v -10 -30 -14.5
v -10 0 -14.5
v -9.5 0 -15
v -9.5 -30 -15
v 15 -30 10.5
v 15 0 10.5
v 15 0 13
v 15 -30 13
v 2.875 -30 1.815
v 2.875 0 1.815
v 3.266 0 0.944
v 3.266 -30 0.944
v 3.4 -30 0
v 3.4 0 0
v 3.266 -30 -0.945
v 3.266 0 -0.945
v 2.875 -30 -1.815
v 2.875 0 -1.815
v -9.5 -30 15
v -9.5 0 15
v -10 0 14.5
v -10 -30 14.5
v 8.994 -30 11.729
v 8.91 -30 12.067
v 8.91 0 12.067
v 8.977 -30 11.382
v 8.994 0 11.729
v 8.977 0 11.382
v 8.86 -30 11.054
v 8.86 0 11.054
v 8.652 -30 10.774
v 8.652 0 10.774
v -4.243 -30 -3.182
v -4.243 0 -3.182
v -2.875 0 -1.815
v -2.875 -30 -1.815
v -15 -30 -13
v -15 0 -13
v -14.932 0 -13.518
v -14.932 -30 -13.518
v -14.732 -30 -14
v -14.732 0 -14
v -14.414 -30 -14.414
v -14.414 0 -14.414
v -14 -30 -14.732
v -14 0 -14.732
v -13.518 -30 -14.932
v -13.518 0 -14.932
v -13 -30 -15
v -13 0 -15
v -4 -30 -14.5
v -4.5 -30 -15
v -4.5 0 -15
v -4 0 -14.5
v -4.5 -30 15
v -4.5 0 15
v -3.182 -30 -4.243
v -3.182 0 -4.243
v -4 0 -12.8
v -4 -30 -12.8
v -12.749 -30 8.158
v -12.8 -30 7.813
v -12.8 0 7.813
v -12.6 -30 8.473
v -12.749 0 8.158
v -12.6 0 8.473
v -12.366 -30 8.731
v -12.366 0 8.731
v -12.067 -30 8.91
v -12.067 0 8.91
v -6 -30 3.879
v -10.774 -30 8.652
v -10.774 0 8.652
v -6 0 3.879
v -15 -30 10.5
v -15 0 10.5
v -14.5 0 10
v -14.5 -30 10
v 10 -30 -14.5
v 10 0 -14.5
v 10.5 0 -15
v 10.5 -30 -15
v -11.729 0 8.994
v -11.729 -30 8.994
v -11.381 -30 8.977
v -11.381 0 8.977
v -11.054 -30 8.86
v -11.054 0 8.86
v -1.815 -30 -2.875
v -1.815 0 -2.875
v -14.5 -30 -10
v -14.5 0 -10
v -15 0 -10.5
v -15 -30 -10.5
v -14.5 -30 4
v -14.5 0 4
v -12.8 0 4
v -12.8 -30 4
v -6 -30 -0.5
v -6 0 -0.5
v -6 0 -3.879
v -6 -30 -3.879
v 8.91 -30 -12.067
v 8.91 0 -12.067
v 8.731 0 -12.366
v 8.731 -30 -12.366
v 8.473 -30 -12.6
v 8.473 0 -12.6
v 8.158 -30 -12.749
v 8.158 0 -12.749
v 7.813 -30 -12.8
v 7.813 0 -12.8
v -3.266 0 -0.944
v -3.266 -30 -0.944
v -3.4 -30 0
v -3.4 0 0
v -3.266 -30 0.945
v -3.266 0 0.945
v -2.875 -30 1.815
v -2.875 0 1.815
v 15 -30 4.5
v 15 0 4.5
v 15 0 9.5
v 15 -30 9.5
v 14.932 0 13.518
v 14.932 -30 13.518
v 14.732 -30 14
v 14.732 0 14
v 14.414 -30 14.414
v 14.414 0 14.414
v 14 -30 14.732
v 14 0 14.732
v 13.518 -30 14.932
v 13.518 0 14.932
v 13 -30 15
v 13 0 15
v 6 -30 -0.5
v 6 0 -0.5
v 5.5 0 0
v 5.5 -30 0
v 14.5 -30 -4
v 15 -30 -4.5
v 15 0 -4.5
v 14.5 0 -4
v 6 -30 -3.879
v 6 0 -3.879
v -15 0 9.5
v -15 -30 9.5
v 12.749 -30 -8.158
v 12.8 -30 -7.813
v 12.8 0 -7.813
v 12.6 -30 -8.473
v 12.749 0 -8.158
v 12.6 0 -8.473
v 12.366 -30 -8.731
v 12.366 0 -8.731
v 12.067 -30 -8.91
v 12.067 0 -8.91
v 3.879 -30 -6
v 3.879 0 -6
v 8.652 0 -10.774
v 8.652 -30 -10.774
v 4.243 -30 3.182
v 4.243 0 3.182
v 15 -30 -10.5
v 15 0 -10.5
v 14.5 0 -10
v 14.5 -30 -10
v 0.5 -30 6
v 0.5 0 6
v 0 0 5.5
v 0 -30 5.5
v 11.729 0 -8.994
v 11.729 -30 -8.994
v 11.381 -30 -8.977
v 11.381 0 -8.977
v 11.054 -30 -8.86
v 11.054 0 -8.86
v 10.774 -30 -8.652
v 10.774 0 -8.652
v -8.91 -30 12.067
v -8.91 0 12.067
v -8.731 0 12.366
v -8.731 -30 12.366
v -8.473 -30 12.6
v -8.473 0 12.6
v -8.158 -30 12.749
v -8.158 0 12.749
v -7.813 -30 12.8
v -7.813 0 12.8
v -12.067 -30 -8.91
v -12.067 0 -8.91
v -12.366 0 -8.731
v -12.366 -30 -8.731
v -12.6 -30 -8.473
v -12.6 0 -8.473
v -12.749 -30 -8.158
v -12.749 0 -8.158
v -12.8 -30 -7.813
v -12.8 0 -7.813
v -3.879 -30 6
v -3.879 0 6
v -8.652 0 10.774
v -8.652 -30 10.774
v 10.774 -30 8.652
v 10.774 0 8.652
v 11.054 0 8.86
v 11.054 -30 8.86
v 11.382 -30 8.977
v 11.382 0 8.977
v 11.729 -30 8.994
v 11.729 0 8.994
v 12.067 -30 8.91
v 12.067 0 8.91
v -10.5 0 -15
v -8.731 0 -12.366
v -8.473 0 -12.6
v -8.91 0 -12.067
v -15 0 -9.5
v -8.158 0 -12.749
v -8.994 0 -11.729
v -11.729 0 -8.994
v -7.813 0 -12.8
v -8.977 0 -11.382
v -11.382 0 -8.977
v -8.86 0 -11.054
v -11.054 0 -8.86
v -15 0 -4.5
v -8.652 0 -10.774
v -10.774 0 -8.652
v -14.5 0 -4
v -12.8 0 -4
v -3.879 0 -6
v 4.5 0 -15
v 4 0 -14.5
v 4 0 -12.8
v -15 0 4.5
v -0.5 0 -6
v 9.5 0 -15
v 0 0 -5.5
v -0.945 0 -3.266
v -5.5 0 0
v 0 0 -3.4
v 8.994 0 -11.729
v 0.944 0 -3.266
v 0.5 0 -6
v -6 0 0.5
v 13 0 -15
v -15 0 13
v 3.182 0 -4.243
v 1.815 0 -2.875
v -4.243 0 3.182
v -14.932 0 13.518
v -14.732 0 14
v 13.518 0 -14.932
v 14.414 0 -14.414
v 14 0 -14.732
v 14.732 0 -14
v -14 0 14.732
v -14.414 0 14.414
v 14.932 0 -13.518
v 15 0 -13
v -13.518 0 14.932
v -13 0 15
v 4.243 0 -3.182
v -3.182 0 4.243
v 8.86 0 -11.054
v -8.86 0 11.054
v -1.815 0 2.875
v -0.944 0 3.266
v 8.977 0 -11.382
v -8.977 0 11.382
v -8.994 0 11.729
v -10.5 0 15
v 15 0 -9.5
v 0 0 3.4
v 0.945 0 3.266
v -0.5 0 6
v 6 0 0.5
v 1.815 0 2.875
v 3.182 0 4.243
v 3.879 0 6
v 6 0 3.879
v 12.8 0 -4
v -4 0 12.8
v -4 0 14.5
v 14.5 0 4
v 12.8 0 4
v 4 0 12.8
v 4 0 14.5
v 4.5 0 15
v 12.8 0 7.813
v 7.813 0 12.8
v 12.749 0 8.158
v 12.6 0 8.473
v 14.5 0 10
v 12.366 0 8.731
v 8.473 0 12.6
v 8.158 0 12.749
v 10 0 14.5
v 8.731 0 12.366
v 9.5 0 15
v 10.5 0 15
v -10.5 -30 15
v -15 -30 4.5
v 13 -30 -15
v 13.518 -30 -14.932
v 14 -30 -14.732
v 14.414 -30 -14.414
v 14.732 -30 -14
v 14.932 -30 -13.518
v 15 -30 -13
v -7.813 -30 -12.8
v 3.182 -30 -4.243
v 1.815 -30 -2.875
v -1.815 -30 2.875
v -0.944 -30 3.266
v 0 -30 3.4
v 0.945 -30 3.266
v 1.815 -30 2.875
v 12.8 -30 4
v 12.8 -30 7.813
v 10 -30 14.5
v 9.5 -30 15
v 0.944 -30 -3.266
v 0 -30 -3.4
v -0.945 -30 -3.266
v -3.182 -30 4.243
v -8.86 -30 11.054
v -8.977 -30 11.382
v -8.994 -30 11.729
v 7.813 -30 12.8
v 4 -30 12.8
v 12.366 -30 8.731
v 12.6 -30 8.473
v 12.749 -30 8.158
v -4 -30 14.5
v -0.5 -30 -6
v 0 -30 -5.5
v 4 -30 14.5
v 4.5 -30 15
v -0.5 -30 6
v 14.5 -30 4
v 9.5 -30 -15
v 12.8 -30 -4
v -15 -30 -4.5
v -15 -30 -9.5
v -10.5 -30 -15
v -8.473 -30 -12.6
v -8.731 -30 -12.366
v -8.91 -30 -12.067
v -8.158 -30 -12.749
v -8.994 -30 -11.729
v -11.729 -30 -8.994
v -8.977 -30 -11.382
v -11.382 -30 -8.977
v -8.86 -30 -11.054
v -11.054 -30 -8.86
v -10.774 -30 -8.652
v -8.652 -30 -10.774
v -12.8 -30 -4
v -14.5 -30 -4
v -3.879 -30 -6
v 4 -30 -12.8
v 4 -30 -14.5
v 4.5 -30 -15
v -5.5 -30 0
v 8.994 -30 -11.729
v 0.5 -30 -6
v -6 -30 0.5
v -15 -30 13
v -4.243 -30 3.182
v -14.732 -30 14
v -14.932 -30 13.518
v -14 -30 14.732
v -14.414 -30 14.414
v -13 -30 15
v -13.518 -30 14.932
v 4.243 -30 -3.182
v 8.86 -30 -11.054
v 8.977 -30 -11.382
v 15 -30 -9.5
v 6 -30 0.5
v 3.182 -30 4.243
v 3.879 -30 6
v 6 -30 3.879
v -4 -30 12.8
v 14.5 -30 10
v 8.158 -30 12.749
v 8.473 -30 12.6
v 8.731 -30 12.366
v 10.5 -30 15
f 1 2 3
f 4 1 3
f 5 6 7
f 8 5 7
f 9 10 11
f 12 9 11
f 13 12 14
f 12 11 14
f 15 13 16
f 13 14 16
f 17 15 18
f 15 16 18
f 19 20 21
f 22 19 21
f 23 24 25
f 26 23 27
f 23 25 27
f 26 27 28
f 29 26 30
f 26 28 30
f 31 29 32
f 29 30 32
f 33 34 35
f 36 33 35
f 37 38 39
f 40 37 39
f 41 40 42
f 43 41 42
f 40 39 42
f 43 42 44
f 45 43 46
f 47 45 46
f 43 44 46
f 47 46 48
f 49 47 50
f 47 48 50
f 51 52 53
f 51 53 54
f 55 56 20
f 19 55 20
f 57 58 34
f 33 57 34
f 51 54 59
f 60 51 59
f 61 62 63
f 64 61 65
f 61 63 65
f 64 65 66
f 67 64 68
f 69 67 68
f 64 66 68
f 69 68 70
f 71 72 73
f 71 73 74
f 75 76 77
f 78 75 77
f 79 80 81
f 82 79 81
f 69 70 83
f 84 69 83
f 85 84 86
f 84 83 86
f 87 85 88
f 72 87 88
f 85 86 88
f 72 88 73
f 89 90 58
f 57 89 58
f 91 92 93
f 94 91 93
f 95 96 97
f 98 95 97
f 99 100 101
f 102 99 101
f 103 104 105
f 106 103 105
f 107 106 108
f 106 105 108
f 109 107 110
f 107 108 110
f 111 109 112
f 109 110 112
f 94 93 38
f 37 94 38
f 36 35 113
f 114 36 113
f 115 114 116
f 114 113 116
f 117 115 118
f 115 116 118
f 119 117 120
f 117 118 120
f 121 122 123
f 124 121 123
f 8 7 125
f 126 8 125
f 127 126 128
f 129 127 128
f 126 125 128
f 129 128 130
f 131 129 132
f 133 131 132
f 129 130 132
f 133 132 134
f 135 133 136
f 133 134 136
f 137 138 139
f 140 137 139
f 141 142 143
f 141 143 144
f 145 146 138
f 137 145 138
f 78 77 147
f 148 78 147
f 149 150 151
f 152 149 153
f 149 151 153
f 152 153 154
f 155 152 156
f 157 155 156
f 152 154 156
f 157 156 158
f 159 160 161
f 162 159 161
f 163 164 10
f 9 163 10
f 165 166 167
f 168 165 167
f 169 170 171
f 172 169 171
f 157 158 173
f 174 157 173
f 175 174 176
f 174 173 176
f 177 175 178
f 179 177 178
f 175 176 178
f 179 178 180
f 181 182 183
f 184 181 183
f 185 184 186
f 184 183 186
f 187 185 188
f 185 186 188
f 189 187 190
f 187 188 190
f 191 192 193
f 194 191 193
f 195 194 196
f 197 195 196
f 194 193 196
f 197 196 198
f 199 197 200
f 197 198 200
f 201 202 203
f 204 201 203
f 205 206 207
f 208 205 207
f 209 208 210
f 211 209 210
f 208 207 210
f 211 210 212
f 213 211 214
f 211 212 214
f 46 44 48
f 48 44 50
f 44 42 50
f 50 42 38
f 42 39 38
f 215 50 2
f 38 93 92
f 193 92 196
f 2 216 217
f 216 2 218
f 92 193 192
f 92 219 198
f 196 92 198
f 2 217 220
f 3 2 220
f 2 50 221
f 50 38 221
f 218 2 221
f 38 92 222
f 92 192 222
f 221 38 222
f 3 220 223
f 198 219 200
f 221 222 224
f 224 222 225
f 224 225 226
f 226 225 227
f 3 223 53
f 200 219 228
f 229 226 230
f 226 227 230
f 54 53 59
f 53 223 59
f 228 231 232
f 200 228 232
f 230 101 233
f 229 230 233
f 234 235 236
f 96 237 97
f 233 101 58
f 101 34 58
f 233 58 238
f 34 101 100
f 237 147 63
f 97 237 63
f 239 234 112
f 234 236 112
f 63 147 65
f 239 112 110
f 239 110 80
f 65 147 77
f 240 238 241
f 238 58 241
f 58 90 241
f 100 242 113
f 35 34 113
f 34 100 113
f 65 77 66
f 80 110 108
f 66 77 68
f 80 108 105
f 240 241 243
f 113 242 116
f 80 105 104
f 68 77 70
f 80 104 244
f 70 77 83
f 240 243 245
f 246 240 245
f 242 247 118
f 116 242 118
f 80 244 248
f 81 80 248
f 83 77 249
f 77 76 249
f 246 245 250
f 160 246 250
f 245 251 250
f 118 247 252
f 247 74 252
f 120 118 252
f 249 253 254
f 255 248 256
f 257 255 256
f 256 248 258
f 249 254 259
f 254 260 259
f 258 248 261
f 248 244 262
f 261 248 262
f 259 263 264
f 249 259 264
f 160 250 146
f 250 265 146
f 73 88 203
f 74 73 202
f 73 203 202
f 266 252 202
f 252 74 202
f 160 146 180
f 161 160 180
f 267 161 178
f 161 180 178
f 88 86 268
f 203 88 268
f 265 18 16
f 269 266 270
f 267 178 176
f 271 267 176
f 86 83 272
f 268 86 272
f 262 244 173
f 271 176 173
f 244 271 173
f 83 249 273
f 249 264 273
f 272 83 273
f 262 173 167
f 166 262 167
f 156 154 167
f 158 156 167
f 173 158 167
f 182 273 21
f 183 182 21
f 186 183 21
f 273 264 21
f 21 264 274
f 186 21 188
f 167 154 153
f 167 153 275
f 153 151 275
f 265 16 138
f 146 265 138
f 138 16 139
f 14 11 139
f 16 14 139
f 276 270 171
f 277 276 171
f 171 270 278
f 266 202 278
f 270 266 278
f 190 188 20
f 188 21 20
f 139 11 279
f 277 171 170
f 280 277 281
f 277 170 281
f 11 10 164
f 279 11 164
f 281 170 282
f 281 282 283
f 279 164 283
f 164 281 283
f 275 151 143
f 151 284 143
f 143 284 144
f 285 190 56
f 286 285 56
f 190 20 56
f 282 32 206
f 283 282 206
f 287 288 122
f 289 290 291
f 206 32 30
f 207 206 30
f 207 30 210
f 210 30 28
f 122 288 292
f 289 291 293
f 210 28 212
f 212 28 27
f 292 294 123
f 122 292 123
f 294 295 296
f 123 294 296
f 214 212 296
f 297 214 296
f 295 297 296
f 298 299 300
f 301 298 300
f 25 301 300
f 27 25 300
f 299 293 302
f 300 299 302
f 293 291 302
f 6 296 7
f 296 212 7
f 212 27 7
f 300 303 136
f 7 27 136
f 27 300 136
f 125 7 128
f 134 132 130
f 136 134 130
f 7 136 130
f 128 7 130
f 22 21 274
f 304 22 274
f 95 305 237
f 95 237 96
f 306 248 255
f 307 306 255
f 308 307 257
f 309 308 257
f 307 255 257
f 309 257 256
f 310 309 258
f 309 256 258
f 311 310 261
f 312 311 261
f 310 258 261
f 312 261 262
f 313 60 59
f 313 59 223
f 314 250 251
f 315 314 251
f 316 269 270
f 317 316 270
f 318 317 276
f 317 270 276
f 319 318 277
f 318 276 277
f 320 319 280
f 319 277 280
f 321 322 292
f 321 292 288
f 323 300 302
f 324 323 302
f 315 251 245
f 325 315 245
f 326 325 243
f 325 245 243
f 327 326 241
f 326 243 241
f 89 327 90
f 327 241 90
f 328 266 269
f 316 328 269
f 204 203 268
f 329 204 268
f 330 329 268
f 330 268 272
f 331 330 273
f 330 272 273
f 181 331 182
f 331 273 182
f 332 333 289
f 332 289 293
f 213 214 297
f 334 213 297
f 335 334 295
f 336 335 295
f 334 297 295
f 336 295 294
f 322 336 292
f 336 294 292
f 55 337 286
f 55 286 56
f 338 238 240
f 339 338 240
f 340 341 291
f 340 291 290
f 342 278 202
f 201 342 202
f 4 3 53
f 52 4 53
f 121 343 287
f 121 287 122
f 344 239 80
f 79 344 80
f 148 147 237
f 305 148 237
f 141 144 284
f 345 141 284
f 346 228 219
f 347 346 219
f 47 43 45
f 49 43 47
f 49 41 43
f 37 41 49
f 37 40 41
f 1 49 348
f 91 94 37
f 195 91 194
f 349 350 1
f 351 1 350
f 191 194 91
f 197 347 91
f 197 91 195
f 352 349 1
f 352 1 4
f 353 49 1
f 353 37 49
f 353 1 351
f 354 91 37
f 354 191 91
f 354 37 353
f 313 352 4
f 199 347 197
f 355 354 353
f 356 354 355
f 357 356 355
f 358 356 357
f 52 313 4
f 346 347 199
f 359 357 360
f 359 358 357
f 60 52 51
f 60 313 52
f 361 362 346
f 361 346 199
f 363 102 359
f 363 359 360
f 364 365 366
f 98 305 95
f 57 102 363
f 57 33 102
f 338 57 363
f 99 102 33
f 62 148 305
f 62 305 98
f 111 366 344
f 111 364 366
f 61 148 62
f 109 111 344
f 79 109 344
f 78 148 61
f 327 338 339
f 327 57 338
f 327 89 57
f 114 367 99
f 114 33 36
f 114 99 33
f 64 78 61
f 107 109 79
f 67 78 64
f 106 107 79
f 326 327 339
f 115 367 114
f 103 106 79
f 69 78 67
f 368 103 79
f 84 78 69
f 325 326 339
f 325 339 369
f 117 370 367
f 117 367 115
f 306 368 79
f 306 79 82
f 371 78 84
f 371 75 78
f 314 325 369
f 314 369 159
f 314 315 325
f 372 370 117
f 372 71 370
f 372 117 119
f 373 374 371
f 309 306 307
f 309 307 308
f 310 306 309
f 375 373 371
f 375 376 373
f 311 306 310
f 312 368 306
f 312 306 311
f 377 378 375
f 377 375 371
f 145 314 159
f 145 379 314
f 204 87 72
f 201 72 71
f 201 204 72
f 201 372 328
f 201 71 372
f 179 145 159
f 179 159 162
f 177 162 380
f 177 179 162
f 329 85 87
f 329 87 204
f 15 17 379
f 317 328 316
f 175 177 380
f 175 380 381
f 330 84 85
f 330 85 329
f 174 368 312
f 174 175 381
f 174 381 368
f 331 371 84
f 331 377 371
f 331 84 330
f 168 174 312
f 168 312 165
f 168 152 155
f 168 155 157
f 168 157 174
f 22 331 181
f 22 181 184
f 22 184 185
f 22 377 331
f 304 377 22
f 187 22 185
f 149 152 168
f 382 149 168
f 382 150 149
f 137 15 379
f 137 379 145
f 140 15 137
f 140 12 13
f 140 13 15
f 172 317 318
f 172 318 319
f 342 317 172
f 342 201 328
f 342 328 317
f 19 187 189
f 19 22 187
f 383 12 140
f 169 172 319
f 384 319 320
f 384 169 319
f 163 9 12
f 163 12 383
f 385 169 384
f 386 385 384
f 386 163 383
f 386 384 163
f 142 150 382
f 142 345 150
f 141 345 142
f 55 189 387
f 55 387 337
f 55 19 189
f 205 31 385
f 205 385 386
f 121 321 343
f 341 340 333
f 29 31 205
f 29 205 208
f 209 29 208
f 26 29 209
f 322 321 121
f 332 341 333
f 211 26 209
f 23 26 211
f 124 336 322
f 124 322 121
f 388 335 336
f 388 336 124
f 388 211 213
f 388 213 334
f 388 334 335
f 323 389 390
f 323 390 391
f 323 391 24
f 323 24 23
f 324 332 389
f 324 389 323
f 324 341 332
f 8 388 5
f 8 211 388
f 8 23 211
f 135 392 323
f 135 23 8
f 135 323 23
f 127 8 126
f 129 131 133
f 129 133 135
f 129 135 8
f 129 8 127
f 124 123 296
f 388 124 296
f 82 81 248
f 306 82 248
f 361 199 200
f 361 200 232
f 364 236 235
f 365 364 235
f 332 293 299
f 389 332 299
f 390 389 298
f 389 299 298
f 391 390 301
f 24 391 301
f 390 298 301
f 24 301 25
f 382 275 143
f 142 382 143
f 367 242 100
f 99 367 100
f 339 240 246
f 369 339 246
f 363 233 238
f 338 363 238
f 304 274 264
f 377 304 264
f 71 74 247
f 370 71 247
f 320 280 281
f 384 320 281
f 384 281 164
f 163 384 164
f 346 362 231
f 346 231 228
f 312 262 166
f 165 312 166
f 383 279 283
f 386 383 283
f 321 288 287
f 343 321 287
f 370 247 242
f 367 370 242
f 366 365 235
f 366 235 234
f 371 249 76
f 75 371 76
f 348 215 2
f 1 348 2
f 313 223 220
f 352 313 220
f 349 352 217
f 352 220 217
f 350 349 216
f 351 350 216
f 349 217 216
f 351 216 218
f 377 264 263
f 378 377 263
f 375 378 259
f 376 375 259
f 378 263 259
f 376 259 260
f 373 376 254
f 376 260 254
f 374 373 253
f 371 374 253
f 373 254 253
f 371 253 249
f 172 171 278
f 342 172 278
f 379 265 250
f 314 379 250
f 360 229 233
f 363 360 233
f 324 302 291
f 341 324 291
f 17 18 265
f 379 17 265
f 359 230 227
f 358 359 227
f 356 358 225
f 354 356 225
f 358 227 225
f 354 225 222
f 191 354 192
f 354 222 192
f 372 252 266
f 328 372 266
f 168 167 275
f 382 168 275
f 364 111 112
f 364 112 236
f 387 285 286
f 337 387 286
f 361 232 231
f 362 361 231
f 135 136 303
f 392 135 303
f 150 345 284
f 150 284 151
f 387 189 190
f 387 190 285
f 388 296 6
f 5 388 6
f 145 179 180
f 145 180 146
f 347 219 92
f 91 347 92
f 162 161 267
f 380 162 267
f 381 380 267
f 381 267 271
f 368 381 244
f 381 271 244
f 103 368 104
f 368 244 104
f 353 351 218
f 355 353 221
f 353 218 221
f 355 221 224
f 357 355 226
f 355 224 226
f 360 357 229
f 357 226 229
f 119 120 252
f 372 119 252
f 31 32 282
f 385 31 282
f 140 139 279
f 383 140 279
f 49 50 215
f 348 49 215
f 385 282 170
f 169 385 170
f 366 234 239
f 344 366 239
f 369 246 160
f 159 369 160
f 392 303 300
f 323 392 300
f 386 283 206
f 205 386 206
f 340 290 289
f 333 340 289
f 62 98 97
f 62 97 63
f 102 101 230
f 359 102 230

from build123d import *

# Parameters (mm, degrees)
F1_DEPTH = 30


# Not quite as in the source:
# - ends of sketch curves that miss each other by under 0.0002 mm in the source are joined


with BuildPart() as f1:
    # F0 (on Front) → F1 (new body)
    with BuildSketch(Plane.XZ):
        with BuildLine():
            ThreePointArc((-12.0672760652, 8.9096491574), (-11.3814883912, 8.9771930389), (-10.7737513132, 8.6523506868))
            Line((-10.7737513132, 8.6523506868), (-6, 3.8786))
            Line((-6, 3.8786), (-6, 0.5))
            Line((-6, 0.5), (-5.5, 0))
            Line((-5.5, 0), (-6, -0.5))
            Line((-6, -0.5), (-6, -3.8786))
            Line((-6, -3.8786), (-10.7738, -8.6524))
            ThreePointArc((-10.7738, -8.6524), (-11.3814883912, -8.9771930389), (-12.0672760652, -8.9096491574))
            ThreePointArc((-12.0672760652, -8.9096491574), (-12.5999492171, -8.4725051968), (-12.799999999, -7.8131))
            Line((-12.799999999, -7.8131), (-12.8, -4))
            Line((-12.8, -4), (-14.5, -4))
            Line((-14.5, -4), (-15, -4.5))
            Line((-15, -4.5), (-15, -9.5))
            Line((-15, -9.5), (-14.5, -10))
            Line((-14.5, -10), (-15, -10.5))
            Line((-15, -10.5), (-15, -13))
            ThreePointArc((-15, -13), (-14.4141844722, -14.4142216524), (-13, -15.0000239995))
            Line((-13, -15.0000239995), (-10.5, -15))
            Line((-10.5, -15), (-10, -14.5))
            Line((-10, -14.5), (-9.5, -15))
            Line((-9.5, -15), (-4.5, -15))
            Line((-4.5, -15), (-4, -14.5))
            Line((-4, -14.5), (-4, -12.8))
            Line((-4, -12.8), (-7.8131, -12.8))
            ThreePointArc((-7.8131, -12.8), (-8.4725048128, -12.5999494737), (-8.9096488038, -12.0672769187))
            ThreePointArc((-8.9096488038, -12.0672769187), (-8.977199798, -11.3815223738), (-8.6523996854, -10.7738003146))
            Line((-8.6523996854, -10.7738003146), (-3.8786, -6))
            Line((-3.8786, -6), (-0.5, -6))
            Line((-0.5, -6), (0, -5.5))
            Line((0, -5.5), (0.5, -6))
            Line((0.5, -6), (3.8786, -6))
            Line((3.8786, -6), (8.6524, -10.7738))
            ThreePointArc((8.6524, -10.7738), (8.977199798, -11.3815223738), (8.9096491574, -12.0672760652))
            ThreePointArc((8.9096491574, -12.0672760652), (8.4725048128, -12.5999494737), (7.8131, -12.799999999))
            Line((7.8131, -12.799999999), (4, -12.8))
            Line((4, -12.8), (4, -14.5))
            Line((4, -14.5), (4.5, -15))
            Line((4.5, -15), (9.5, -15))
            Line((9.5, -15), (10, -14.5))
            Line((10, -14.5), (10.5, -15))
            Line((10.5, -15), (13, -15))
            ThreePointArc((13, -15), (14.4141844722, -14.4142216524), (14.999955, -13.000024))
            Line((14.999955, -13.000024), (15, -10.5))
            Line((15, -10.5), (14.5, -10))
            Line((14.5, -10), (15, -9.5))
            Line((15, -9.5), (15, -4.5))
            Line((15, -4.5), (14.5, -4))
            Line((14.5, -4), (12.8, -4))
            Line((12.8, -4), (12.8, -7.8131))
            ThreePointArc((12.8, -7.8131), (12.5999492171, -8.4725051968), (12.0672760652, -8.9096491574))
            ThreePointArc((12.0672760652, -8.9096491574), (11.3814883912, -8.9771930389), (10.7737513132, -8.6523506868))
            Line((10.7737513132, -8.6523506868), (6, -3.8786))
            Line((6, -3.8786), (6, -0.5))
            Line((6, -0.5), (5.5, 0))
            Line((5.5, 0), (6, 0.5))
            Line((6, 0.5), (6, 3.8786))
            Line((6, 3.8786), (10.7738, 8.6524))
            ThreePointArc((10.7738, 8.6524), (11.3814883912, 8.9771930389), (12.0672760652, 8.9096491574))
            ThreePointArc((12.0672760652, 8.9096491574), (12.5999492171, 8.4725051968), (12.799999999, 7.8131))
            Line((12.799999999, 7.8131), (12.8, 4))
            Line((12.8, 4), (14.5, 4))
            Line((14.5, 4), (15, 4.5))
            Line((15, 4.5), (15, 9.5))
            Line((15, 9.5), (14.5, 10))
            Line((14.5, 10), (15, 10.5))
            Line((15, 10.5), (15, 13))
            ThreePointArc((15, 13), (14.4141844722, 14.4142216524), (13, 15.0000239995))
            Line((13, 15.0000239995), (10.5, 15))
            Line((10.5, 15), (10, 14.5))
            Line((10, 14.5), (9.5, 15))
            Line((9.5, 15), (4.5, 15))
            Line((4.5, 15), (4, 14.5))
            Line((4, 14.5), (4, 12.8))
            Line((4, 12.8), (7.8131, 12.8))
            ThreePointArc((7.8131, 12.8), (8.4725048128, 12.5999494737), (8.9096488038, 12.0672769187))
            ThreePointArc((8.9096488038, 12.0672769187), (8.977199798, 11.3815223738), (8.6523996854, 10.7738003146))
            Line((8.6523996854, 10.7738003146), (3.8786, 6))
            Line((3.8786, 6), (0.5, 6))
            Line((0.5, 6), (0, 5.5))
            Line((0, 5.5), (-0.5, 6))
            Line((-0.5, 6), (-3.8786, 6))
            Line((-3.8786, 6), (-8.6524, 10.7738))
            ThreePointArc((-8.6524, 10.7738), (-8.977199798, 11.3815223738), (-8.9096491574, 12.0672760652))
            ThreePointArc((-8.9096491574, 12.0672760652), (-8.4725048128, 12.5999494737), (-7.8131, 12.799999999))
            Line((-7.8131, 12.799999999), (-4, 12.8))
            Line((-4, 12.8), (-4, 14.5))
            Line((-4, 14.5), (-4.5, 15))
            Line((-4.5, 15), (-9.5, 15))
            Line((-9.5, 15), (-10, 14.5))
            Line((-10, 14.5), (-10.5, 15))
            Line((-10.5, 15), (-13, 15))
            ThreePointArc((-13, 15), (-14.4141844722, 14.4142216524), (-14.999955, 13.000024))
            Line((-14.999955, 13.000024), (-15, 10.5))
            Line((-15, 10.5), (-14.5, 10))
            Line((-14.5, 10), (-15, 9.5))
            Line((-15, 9.5), (-15, 4.5))
            Line((-15, 4.5), (-14.5, 4))
            Line((-14.5, 4), (-12.8, 4))
            Line((-12.8, 4), (-12.8, 7.8131))
            ThreePointArc((-12.8, 7.8131), (-12.5999492171, 8.4725051968), (-12.0672760652, 8.9096491574))
        make_face()
        with BuildLine():
            Line((-4.2426, -3.182), (-2.8752, -1.8146))
            ThreePointArc((-2.8752, -1.8146), (-3.4, 0), (-2.8752481958, 1.8146481236))
            Line((-2.8752481958, 1.8146481236), (-4.2426, 3.182))
            Line((-4.2426, 3.182), (-3.182, 4.2426))
            Line((-3.182, 4.2426), (-1.8146, 2.8752))
            ThreePointArc((-1.8146, 2.8752), (0, 3.4), (1.8146481236, 2.8752481958))
            Line((1.8146481236, 2.8752481958), (3.182, 4.2426))
            Line((3.182, 4.2426), (4.2426, 3.182))
            Line((4.2426, 3.182), (2.8752, 1.8146))
            ThreePointArc((2.8752, 1.8146), (3.4, 0), (2.8752481958, -1.8146481236))
            Line((2.8752481958, -1.8146481236), (4.2426, -3.182))
            Line((4.2426, -3.182), (3.182, -4.2426))
            Line((3.182, -4.2426), (1.8146, -2.8752))
            ThreePointArc((1.8146, -2.8752), (0, -3.4), (-1.8146481236, -2.8752481958))
            Line((-1.8146481236, -2.8752481958), (-3.182, -4.2426))
            Line((-3.182, -4.2426), (-4.2426, -3.182))
        make_face(mode=Mode.SUBTRACT)
    extrude(amount=F1_DEPTH)


solid = f1.part
